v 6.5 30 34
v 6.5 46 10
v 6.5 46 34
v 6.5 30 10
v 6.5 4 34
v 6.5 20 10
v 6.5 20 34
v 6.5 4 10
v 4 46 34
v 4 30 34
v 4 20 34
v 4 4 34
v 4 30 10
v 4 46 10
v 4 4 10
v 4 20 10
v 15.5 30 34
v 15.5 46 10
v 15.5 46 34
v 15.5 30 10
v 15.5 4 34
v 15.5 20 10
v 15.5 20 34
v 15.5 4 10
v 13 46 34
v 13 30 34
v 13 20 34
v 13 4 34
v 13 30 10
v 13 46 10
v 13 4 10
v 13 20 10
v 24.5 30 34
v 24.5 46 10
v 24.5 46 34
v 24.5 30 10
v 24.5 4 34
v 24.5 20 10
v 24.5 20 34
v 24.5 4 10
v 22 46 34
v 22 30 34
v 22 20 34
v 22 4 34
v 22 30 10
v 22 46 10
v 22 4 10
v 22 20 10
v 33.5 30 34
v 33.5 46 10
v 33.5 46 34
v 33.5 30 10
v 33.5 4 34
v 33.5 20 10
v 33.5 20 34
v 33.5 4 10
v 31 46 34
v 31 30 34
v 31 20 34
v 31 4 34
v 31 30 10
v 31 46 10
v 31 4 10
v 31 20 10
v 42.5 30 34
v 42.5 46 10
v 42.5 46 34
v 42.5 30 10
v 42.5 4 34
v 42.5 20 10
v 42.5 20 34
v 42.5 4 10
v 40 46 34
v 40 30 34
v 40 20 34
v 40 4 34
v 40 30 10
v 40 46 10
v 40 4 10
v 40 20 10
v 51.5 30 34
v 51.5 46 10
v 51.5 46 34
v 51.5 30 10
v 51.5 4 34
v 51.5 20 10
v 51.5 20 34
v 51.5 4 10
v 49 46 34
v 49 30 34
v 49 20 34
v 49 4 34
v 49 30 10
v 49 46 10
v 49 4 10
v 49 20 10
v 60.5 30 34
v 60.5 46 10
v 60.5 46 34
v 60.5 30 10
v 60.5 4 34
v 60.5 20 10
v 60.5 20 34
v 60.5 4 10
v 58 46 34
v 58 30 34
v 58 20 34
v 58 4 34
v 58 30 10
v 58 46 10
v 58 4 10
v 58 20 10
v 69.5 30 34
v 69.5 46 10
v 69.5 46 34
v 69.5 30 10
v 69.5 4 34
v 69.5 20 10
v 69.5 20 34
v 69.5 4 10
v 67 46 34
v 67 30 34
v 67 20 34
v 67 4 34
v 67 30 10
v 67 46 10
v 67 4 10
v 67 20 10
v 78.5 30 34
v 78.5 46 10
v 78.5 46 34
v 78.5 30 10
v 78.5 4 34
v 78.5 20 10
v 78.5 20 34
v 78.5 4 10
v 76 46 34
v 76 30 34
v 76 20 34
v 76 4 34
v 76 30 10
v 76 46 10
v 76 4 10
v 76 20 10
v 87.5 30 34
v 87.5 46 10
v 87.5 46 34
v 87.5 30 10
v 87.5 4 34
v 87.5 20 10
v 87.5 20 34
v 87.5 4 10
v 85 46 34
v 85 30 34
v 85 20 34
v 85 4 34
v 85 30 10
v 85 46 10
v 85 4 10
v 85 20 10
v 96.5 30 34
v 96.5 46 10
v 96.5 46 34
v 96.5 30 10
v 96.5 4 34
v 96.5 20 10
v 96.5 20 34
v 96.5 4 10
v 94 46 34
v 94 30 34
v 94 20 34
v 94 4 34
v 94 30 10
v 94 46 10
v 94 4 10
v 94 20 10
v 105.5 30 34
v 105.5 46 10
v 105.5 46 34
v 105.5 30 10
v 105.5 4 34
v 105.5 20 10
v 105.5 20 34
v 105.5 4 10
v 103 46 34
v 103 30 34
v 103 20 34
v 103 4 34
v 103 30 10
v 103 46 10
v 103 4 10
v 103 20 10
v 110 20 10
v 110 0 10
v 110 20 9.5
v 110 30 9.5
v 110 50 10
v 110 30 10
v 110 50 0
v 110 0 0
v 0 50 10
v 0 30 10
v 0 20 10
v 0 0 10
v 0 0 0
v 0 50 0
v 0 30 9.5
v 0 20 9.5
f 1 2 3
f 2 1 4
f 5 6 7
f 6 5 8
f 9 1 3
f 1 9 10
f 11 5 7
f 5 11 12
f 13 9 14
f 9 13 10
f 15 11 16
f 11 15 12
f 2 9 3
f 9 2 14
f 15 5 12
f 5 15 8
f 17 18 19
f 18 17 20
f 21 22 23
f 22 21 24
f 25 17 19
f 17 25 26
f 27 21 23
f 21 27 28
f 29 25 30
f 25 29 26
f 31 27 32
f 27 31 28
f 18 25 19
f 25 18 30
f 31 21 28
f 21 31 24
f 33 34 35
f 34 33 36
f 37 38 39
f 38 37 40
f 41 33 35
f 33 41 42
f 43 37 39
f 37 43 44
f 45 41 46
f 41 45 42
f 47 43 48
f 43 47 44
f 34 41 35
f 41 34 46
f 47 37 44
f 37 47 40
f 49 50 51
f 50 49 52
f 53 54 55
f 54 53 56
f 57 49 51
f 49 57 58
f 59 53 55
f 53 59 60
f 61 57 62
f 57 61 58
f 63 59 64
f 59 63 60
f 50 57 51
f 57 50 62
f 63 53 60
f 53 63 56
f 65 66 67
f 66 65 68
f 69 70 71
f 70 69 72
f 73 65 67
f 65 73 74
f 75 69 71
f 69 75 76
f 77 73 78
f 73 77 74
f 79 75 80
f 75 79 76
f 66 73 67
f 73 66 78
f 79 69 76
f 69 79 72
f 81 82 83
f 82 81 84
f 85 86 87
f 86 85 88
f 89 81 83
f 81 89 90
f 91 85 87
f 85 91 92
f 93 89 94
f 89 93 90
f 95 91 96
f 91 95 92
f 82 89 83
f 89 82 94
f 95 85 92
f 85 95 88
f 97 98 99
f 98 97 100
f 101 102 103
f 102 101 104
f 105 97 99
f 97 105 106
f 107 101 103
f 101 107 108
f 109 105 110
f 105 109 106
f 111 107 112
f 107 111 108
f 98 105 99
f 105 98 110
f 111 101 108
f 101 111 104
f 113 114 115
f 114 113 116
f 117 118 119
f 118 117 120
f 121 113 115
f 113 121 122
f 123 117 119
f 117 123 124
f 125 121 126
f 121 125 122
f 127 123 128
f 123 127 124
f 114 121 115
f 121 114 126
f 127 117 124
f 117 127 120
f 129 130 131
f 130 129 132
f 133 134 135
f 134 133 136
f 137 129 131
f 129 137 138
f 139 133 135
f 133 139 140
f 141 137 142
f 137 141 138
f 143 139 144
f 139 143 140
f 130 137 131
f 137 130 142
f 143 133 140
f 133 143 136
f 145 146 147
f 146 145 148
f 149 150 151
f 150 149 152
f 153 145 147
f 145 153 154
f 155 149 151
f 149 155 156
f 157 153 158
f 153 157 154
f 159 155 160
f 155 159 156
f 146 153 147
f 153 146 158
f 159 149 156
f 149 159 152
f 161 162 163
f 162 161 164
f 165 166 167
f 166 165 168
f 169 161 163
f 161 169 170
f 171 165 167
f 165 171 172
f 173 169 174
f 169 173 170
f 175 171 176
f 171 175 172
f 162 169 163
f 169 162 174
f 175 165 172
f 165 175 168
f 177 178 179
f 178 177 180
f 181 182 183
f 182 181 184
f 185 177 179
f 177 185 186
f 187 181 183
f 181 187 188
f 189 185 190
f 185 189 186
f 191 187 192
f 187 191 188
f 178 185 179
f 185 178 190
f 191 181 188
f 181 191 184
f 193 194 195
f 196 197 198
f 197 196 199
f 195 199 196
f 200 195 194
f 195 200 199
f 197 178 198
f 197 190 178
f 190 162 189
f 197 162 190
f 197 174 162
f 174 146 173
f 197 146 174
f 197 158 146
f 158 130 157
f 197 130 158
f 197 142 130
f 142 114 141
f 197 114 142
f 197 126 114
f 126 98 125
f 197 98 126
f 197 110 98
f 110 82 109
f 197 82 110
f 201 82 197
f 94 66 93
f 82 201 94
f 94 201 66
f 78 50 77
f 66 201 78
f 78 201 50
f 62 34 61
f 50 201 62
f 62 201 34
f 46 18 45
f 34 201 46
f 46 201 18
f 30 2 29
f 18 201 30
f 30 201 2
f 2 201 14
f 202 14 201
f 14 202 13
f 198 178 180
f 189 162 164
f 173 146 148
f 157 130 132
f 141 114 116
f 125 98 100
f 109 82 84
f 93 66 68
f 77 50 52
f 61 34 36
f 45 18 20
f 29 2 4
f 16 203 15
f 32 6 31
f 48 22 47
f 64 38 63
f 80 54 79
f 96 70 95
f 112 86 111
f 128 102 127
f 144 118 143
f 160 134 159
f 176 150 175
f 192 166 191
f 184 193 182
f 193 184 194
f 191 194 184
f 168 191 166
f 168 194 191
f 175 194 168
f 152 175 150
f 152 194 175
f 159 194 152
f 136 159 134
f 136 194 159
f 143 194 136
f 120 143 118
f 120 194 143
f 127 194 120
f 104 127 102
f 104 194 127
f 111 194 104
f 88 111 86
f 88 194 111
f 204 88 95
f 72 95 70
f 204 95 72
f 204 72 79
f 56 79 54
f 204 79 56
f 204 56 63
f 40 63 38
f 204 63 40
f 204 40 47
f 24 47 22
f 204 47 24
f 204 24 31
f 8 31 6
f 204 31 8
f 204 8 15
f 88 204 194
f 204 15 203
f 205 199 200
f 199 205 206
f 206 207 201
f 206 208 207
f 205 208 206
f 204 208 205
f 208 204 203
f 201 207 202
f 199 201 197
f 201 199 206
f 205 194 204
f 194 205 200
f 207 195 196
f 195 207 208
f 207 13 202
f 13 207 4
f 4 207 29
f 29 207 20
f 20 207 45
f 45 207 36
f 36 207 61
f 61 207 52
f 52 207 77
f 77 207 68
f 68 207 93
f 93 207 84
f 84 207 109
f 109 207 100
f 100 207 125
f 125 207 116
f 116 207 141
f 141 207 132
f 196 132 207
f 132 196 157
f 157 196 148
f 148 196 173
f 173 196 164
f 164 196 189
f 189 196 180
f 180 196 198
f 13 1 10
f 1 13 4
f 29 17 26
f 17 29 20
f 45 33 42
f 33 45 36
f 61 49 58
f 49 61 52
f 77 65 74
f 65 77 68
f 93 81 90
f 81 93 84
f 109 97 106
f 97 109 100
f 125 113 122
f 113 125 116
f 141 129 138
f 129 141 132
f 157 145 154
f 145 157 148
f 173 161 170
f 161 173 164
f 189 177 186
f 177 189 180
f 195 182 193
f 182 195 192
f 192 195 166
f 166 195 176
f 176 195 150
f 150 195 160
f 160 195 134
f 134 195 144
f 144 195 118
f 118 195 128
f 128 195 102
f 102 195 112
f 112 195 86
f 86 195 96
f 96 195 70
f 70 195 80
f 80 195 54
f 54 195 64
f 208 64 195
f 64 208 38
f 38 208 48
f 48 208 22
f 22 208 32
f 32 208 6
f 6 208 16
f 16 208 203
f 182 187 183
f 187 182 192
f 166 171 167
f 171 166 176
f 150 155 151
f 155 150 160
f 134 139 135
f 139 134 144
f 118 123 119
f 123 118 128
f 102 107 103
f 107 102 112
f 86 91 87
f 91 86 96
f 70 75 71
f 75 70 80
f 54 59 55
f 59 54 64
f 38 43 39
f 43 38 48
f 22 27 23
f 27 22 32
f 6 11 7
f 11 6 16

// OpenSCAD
$fn = 32;

// ----------------------------------------------------------------------
// Heatsink: slotted fin block
// ----------------------------------------------------------------------

// --- parameters (mm) ---
base_l = 110;             // base length, X
base_w = 50;              // base width, Y
base_t = 10;              // base plate thickness
fin_h = 25;               // fin height above the base
fin_t = 2.5;              // fin thickness
edge = 4;                 // margin from the base ends
pitch = 9;                // fin pitch
slot_w = 10;              // central slot width, Y
fit_tol = 0.1;            // tolerance for press fits, mm
free_tol = 0.3;           // tolerance for clearance fits, mm

n_fins = floor((base_l - 2 * edge - fin_t) / pitch) + 1;  // fin count
total_h = base_t + fin_h - 1;  // overall height

difference() {
union() {
  cube([base_l, base_w, base_t]);
  for (i = [0 : n_fins - 1])
    translate([edge + i * pitch, edge, base_t - 1])
      cube([fin_t, base_w - 2 * edge, fin_h]);
}
  translate([-1, base_w / 2 - slot_w / 2, base_t - 0.5])
    cube([base_l + 2, slot_w, fin_h + 2]);
}
